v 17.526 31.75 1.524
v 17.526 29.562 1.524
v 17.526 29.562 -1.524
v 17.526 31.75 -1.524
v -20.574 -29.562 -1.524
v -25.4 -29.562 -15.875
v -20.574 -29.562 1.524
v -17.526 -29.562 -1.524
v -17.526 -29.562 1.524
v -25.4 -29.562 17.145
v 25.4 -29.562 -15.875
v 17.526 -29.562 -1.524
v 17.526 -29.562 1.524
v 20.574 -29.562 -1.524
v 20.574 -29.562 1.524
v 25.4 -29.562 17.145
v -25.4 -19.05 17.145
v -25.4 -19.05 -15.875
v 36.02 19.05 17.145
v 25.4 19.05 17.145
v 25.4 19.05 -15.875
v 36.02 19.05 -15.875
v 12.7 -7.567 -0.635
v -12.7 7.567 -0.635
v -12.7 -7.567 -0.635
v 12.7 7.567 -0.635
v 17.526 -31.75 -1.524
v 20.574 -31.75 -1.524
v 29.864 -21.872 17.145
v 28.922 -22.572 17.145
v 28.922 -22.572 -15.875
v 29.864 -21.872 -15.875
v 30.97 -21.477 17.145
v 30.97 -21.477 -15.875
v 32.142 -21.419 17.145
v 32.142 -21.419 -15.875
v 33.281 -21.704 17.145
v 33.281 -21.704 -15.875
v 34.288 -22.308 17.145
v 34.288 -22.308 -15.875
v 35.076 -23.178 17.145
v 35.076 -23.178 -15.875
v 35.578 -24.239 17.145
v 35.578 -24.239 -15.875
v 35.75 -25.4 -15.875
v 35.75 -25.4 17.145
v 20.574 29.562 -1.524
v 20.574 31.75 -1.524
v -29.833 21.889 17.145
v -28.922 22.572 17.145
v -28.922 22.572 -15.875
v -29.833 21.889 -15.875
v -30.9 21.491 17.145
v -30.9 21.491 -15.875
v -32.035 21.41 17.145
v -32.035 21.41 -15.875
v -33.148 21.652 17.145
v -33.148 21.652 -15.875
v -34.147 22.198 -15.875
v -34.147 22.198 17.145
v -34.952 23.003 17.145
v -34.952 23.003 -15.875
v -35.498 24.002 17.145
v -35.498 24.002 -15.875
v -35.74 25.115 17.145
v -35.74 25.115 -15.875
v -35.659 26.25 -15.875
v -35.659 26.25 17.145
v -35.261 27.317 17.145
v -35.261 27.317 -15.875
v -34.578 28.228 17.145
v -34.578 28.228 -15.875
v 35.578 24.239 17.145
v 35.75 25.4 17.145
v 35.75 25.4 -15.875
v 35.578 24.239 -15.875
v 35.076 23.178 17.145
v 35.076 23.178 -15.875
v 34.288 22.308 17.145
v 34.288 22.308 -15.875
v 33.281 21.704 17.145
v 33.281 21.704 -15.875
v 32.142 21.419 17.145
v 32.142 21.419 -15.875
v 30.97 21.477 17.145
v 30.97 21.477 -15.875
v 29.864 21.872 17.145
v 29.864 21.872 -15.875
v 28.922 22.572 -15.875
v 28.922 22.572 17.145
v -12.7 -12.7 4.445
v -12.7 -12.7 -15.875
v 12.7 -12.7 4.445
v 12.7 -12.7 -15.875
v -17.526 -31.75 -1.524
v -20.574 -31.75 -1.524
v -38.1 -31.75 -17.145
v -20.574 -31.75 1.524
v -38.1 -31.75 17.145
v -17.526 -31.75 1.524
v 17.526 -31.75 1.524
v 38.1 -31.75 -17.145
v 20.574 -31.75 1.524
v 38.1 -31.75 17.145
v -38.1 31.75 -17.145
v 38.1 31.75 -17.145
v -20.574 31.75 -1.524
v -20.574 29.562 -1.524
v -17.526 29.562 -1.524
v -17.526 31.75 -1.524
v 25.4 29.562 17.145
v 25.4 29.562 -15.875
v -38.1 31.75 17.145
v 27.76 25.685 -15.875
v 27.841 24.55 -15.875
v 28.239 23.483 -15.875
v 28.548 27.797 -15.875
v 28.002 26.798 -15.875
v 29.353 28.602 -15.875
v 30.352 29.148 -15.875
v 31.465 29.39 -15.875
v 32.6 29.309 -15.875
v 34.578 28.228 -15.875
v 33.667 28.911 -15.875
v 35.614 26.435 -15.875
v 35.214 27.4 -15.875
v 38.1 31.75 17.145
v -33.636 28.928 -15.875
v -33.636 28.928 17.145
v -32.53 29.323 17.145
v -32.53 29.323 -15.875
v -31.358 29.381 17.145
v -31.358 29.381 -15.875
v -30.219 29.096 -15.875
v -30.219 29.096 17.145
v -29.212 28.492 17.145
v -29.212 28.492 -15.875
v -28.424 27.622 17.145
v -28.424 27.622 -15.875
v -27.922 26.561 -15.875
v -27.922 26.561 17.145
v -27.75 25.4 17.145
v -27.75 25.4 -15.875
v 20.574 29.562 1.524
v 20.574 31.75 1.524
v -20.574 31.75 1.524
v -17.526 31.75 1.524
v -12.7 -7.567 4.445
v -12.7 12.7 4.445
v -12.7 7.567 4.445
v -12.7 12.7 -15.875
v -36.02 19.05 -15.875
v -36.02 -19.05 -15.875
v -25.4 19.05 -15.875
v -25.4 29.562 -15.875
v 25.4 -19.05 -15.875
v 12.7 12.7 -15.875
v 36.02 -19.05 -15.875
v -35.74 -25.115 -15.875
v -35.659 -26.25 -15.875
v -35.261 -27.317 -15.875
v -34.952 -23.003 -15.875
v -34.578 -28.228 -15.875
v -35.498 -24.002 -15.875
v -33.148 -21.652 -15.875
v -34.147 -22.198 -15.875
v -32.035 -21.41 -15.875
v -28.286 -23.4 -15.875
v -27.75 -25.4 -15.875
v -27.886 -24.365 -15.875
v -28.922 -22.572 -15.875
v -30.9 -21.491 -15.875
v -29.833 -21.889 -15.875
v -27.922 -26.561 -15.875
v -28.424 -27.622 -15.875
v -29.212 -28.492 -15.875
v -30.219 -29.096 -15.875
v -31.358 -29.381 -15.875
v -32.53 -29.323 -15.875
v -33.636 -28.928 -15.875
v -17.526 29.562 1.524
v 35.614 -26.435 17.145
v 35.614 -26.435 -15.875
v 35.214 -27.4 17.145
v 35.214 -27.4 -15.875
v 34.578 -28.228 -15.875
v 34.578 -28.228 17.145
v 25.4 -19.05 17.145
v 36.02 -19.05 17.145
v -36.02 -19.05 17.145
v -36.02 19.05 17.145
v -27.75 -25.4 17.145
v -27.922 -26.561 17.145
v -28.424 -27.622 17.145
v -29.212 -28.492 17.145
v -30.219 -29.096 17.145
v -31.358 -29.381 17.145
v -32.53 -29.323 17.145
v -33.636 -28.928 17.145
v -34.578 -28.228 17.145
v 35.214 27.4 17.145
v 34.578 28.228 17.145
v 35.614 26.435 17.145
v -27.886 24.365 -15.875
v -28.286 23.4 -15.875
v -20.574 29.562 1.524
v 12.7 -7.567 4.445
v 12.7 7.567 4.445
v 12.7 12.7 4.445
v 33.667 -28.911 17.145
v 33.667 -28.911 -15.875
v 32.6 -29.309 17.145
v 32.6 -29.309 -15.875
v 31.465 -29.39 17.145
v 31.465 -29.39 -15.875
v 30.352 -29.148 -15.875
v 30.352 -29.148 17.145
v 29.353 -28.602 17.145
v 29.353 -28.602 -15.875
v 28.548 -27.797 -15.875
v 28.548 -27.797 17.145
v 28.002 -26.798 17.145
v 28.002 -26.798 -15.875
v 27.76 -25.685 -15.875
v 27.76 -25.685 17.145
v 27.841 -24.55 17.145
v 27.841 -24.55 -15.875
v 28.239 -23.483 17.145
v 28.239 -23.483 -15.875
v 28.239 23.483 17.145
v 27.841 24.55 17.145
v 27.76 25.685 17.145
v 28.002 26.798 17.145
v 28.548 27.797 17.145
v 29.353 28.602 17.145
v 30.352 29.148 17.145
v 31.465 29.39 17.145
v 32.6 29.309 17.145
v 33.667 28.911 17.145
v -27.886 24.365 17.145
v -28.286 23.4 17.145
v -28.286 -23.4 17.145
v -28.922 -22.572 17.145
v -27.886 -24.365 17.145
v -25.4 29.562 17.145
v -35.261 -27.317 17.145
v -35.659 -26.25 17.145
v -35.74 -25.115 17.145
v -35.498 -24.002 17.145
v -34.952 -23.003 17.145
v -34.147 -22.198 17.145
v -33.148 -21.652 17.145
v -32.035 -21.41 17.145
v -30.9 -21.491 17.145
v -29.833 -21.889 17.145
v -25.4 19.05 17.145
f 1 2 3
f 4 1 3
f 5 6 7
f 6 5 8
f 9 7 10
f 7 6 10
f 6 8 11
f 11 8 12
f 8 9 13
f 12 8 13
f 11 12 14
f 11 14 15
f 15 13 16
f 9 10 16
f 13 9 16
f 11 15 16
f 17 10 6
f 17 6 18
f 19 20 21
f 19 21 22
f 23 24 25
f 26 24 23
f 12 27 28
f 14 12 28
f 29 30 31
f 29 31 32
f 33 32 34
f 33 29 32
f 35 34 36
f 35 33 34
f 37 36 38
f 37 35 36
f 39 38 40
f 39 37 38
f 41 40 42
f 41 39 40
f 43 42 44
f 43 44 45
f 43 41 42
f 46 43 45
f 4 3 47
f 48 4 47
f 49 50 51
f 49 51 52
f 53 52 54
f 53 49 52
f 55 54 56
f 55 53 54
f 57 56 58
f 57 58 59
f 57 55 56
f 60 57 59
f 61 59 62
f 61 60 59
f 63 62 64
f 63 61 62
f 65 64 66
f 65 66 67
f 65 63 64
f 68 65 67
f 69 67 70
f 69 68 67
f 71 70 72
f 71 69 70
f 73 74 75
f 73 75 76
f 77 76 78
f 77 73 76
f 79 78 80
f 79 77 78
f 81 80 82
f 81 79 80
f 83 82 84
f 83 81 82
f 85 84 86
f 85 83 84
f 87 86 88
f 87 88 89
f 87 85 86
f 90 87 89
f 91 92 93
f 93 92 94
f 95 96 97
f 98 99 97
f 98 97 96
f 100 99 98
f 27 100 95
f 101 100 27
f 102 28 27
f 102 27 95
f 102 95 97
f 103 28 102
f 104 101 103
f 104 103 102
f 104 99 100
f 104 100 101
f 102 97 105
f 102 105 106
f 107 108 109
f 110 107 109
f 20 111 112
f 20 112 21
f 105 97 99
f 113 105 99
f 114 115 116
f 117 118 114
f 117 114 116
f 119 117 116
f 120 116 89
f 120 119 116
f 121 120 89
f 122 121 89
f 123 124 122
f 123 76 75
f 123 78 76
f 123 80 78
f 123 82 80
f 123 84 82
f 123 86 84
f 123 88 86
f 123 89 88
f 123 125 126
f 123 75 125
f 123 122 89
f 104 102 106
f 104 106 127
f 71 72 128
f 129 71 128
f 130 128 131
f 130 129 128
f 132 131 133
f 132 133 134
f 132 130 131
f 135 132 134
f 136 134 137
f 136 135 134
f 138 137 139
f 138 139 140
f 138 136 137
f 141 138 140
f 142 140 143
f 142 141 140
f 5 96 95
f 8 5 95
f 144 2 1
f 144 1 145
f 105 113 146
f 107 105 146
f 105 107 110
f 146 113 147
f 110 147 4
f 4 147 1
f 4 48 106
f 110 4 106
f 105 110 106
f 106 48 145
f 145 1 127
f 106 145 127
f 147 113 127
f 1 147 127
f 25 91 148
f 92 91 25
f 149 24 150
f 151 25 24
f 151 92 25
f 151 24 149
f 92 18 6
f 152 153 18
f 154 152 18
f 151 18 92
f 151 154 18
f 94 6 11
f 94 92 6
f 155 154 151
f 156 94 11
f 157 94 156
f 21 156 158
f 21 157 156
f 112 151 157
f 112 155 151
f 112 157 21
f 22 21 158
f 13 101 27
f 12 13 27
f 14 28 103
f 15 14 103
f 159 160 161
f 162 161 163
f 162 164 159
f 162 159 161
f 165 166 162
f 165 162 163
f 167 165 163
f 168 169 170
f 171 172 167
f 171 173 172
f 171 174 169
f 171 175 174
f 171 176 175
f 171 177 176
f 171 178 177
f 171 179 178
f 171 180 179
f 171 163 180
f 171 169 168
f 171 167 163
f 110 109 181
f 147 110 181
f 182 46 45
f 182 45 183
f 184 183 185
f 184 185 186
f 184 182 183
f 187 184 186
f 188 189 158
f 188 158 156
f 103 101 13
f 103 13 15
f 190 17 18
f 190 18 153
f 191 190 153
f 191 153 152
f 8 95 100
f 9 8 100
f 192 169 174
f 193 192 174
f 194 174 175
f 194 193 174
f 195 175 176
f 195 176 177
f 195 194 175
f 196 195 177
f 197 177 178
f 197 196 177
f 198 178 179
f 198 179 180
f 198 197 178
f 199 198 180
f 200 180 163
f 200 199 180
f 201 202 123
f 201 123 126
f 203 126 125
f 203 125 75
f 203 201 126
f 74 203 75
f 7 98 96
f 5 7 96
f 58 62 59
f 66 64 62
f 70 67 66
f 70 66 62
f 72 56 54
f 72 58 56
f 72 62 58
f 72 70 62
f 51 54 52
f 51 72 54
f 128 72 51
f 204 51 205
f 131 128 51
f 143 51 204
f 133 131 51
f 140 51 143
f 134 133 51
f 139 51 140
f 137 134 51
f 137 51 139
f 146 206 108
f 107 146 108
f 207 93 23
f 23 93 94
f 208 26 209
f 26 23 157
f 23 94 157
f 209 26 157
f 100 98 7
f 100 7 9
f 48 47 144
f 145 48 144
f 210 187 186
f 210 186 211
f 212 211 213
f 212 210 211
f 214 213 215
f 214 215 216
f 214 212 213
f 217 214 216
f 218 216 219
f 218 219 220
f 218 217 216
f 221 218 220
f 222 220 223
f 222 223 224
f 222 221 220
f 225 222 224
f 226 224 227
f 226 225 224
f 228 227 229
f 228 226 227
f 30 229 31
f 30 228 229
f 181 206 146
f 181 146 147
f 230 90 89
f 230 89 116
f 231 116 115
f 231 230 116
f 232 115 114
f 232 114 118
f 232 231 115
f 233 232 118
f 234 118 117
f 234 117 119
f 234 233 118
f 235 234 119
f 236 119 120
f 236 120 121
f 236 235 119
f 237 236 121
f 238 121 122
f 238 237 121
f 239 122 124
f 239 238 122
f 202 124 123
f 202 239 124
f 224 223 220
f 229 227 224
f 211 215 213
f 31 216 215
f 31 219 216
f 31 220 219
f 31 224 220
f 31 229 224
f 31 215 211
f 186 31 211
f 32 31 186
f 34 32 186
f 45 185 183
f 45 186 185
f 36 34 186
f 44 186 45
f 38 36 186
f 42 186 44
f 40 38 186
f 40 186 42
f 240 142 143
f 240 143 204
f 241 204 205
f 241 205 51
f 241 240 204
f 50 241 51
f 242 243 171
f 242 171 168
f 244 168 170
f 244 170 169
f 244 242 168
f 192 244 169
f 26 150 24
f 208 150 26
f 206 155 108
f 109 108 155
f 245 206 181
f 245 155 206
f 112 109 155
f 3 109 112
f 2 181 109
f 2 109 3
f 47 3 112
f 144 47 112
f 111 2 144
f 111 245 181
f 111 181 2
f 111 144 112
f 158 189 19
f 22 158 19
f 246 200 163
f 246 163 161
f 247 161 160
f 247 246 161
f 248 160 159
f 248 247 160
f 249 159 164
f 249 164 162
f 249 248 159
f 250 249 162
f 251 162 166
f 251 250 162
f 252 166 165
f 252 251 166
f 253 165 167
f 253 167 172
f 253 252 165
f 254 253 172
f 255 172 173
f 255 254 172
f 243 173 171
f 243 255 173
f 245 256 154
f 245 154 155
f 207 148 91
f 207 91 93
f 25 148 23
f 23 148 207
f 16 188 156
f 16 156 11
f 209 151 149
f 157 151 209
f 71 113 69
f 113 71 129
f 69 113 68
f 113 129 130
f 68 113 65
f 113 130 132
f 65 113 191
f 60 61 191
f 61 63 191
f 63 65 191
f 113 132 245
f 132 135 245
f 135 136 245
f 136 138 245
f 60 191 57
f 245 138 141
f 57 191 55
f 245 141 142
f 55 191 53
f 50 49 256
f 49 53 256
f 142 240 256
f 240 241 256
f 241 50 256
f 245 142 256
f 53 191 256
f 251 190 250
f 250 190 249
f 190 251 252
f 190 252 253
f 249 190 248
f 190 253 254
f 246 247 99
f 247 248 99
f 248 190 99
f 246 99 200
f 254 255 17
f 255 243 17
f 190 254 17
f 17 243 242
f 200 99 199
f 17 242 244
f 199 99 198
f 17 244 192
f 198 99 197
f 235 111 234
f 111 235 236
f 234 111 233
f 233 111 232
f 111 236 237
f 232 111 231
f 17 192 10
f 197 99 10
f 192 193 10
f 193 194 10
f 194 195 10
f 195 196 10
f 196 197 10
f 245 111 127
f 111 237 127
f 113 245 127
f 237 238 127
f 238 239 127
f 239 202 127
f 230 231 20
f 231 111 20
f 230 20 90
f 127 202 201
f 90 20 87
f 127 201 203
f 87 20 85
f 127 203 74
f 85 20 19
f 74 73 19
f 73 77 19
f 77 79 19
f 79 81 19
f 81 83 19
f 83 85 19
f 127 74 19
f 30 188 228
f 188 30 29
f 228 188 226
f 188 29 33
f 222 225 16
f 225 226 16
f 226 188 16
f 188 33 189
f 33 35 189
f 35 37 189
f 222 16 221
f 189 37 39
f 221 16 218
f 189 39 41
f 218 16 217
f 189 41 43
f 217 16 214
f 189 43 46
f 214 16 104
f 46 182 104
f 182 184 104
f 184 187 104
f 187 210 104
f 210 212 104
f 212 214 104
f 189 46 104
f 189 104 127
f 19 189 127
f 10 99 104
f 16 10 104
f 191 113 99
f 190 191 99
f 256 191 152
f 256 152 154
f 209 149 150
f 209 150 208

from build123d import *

# Parameters (mm, degrees)
F0_W      = 76.2
F0_H      = 34.29
F1_DEPTH  = 31.75
F2_W      = 72.039268
F2_H      = 59.124664
F3_DEPTH  = 33.02
F4_W      = 3.048
F4_H      = 1.524
F5_DEPTH  = 76.2
F7_DEPTH  = 33.02
F8_W      = 25.4
F8_H      = 25.4
F9_DEPTH  = 20.32
F10_W     = 25.4
F10_H     = 15.1343
F11_DEPTH = 5.08


with BuildPart() as f1:
    # F0 (on Front) → F1 (new body, symmetric)
    with BuildSketch(Plane.XZ):
        Rectangle(F0_W, F0_H)
    extrude(amount=F1_DEPTH, both=True)

    # F2 (on face) → F3 (cut)
    with BuildSketch(Plane.XY.offset(17.145)):
        Rectangle(F2_W, F2_H)
    extrude(amount=-F3_DEPTH, mode=Mode.SUBTRACT)

    # F4 (on face) → F5 (cut)
    with BuildSketch(Plane.XZ.offset(31.75)):
        with Locations((-19.05, 0.762)):
            Rectangle(F4_W, F4_H)
        with Locations((19.05, 0.762)):
            Rectangle(F4_W, F4_H)
        with Locations((19.05, -0.762)):
            Rectangle(F4_W, F4_H)
        with Locations((-19.05, -0.762)):
            Rectangle(F4_W, F4_H)
    extrude(amount=-F5_DEPTH, mode=Mode.SUBTRACT)

    # F6 (on face) → F7 (join)
    with BuildSketch(Plane.XY.offset(17.145)):
        with BuildLine():
            Line((-34.578427, 28.228427), (-38.1, 31.75))
            Line((-38.1, 31.75), (-38.1, 19.05))
            Line((-38.1, 19.05), (-25.4, 19.05))
            Line((-25.4, 19.05), (-28.921573, 22.571573))
            ThreePointArc((-28.921573, 22.571573), (-34.578427, 22.571573), (-34.578427, 28.228427))
        make_face()
        with BuildLine():
            Line((-25.4, 31.75), (-38.1, 31.75))
            Line((-38.1, 31.75), (-34.578427, 28.228427))
            ThreePointArc((-34.578427, 28.228427), (-30.219266, 29.095518), (-27.75, 25.4))
            ThreePointArc((-27.75, 25.4), (-28.054482, 23.869266), (-28.921573, 22.571573))
            Line((-28.921573, 22.571573), (-25.4, 19.05))
            Line((-25.4, 19.05), (-25.4, 31.75))
        make_face()
        with BuildLine():
            Line((-34.578427, -28.228427), (-38.1, -31.75))
            Line((-38.1, -31.75), (-25.4, -31.75))
            Line((-25.4, -31.75), (-25.4, -19.05))
            Line((-25.4, -19.05), (-28.921573, -22.571573))
            ThreePointArc((-28.921573, -22.571573), (-28.054482, -23.869266), (-27.75, -25.4))
            ThreePointArc((-27.75, -25.4), (-30.219266, -29.095518), (-34.578427, -28.228427))
        make_face()
        with BuildLine():
            Line((-38.1, -19.05), (-38.1, -31.75))
            Line((-38.1, -31.75), (-34.578427, -28.228427))
            ThreePointArc((-34.578427, -28.228427), (-34.578427, -22.571573), (-28.921573, -22.571573))
            Line((-28.921573, -22.571573), (-25.4, -19.05))
            Line((-25.4, -19.05), (-38.1, -19.05))
        make_face()
        with BuildLine():
            Line((34.578427, -28.228427), (38.1, -31.75))
            Line((38.1, -31.75), (38.1, -19.05))
            Line((38.1, -19.05), (25.4, -19.05))
            Line((25.4, -19.05), (28.921573, -22.571573))
            ThreePointArc((28.921573, -22.571573), (33.280734, -21.704482), (35.75, -25.4))
            ThreePointArc((35.75, -25.4), (35.445518, -26.930734), (34.578427, -28.228427))
        make_face()
        with BuildLine():
            Line((25.4, -31.75), (38.1, -31.75))
            Line((38.1, -31.75), (34.578427, -28.228427))
            ThreePointArc((34.578427, -28.228427), (28.921573, -28.228427), (28.921573, -22.571573))
            Line((28.921573, -22.571573), (25.4, -19.05))
            Line((25.4, -19.05), (25.4, -31.75))
        make_face()
        with BuildLine():
            Line((34.578427, 28.228427), (38.1, 31.75))
            Line((38.1, 31.75), (25.4, 31.75))
            Line((25.4, 31.75), (25.4, 19.05))
            Line((25.4, 19.05), (28.921573, 22.571573))
            ThreePointArc((28.921573, 22.571573), (28.921573, 28.228427), (34.578427, 28.228427))
        make_face()
        with BuildLine():
            Line((38.1, 19.05), (38.1, 31.75))
            Line((38.1, 31.75), (34.578427, 28.228427))
            ThreePointArc((34.578427, 28.228427), (35.445518, 26.930734), (35.75, 25.4))
            ThreePointArc((35.75, 25.4), (33.280734, 21.704482), (28.921573, 22.571573))
            Line((28.921573, 22.571573), (25.4, 19.05))
            Line((25.4, 19.05), (38.1, 19.05))
        make_face()
    extrude(amount=-F7_DEPTH)

    # F8 (on face) → F9 (join)
    with BuildSketch(Plane.XY.offset(-15.875)):
        Rectangle(F8_W, F8_H)
    extrude(amount=F9_DEPTH)

    # F10 (on face) → F11 (cut)
    with BuildSketch(Plane.XY.offset(4.445)):
        Rectangle(F10_W, F10_H)
    extrude(amount=-F11_DEPTH, mode=Mode.SUBTRACT)


solid = f1.part
